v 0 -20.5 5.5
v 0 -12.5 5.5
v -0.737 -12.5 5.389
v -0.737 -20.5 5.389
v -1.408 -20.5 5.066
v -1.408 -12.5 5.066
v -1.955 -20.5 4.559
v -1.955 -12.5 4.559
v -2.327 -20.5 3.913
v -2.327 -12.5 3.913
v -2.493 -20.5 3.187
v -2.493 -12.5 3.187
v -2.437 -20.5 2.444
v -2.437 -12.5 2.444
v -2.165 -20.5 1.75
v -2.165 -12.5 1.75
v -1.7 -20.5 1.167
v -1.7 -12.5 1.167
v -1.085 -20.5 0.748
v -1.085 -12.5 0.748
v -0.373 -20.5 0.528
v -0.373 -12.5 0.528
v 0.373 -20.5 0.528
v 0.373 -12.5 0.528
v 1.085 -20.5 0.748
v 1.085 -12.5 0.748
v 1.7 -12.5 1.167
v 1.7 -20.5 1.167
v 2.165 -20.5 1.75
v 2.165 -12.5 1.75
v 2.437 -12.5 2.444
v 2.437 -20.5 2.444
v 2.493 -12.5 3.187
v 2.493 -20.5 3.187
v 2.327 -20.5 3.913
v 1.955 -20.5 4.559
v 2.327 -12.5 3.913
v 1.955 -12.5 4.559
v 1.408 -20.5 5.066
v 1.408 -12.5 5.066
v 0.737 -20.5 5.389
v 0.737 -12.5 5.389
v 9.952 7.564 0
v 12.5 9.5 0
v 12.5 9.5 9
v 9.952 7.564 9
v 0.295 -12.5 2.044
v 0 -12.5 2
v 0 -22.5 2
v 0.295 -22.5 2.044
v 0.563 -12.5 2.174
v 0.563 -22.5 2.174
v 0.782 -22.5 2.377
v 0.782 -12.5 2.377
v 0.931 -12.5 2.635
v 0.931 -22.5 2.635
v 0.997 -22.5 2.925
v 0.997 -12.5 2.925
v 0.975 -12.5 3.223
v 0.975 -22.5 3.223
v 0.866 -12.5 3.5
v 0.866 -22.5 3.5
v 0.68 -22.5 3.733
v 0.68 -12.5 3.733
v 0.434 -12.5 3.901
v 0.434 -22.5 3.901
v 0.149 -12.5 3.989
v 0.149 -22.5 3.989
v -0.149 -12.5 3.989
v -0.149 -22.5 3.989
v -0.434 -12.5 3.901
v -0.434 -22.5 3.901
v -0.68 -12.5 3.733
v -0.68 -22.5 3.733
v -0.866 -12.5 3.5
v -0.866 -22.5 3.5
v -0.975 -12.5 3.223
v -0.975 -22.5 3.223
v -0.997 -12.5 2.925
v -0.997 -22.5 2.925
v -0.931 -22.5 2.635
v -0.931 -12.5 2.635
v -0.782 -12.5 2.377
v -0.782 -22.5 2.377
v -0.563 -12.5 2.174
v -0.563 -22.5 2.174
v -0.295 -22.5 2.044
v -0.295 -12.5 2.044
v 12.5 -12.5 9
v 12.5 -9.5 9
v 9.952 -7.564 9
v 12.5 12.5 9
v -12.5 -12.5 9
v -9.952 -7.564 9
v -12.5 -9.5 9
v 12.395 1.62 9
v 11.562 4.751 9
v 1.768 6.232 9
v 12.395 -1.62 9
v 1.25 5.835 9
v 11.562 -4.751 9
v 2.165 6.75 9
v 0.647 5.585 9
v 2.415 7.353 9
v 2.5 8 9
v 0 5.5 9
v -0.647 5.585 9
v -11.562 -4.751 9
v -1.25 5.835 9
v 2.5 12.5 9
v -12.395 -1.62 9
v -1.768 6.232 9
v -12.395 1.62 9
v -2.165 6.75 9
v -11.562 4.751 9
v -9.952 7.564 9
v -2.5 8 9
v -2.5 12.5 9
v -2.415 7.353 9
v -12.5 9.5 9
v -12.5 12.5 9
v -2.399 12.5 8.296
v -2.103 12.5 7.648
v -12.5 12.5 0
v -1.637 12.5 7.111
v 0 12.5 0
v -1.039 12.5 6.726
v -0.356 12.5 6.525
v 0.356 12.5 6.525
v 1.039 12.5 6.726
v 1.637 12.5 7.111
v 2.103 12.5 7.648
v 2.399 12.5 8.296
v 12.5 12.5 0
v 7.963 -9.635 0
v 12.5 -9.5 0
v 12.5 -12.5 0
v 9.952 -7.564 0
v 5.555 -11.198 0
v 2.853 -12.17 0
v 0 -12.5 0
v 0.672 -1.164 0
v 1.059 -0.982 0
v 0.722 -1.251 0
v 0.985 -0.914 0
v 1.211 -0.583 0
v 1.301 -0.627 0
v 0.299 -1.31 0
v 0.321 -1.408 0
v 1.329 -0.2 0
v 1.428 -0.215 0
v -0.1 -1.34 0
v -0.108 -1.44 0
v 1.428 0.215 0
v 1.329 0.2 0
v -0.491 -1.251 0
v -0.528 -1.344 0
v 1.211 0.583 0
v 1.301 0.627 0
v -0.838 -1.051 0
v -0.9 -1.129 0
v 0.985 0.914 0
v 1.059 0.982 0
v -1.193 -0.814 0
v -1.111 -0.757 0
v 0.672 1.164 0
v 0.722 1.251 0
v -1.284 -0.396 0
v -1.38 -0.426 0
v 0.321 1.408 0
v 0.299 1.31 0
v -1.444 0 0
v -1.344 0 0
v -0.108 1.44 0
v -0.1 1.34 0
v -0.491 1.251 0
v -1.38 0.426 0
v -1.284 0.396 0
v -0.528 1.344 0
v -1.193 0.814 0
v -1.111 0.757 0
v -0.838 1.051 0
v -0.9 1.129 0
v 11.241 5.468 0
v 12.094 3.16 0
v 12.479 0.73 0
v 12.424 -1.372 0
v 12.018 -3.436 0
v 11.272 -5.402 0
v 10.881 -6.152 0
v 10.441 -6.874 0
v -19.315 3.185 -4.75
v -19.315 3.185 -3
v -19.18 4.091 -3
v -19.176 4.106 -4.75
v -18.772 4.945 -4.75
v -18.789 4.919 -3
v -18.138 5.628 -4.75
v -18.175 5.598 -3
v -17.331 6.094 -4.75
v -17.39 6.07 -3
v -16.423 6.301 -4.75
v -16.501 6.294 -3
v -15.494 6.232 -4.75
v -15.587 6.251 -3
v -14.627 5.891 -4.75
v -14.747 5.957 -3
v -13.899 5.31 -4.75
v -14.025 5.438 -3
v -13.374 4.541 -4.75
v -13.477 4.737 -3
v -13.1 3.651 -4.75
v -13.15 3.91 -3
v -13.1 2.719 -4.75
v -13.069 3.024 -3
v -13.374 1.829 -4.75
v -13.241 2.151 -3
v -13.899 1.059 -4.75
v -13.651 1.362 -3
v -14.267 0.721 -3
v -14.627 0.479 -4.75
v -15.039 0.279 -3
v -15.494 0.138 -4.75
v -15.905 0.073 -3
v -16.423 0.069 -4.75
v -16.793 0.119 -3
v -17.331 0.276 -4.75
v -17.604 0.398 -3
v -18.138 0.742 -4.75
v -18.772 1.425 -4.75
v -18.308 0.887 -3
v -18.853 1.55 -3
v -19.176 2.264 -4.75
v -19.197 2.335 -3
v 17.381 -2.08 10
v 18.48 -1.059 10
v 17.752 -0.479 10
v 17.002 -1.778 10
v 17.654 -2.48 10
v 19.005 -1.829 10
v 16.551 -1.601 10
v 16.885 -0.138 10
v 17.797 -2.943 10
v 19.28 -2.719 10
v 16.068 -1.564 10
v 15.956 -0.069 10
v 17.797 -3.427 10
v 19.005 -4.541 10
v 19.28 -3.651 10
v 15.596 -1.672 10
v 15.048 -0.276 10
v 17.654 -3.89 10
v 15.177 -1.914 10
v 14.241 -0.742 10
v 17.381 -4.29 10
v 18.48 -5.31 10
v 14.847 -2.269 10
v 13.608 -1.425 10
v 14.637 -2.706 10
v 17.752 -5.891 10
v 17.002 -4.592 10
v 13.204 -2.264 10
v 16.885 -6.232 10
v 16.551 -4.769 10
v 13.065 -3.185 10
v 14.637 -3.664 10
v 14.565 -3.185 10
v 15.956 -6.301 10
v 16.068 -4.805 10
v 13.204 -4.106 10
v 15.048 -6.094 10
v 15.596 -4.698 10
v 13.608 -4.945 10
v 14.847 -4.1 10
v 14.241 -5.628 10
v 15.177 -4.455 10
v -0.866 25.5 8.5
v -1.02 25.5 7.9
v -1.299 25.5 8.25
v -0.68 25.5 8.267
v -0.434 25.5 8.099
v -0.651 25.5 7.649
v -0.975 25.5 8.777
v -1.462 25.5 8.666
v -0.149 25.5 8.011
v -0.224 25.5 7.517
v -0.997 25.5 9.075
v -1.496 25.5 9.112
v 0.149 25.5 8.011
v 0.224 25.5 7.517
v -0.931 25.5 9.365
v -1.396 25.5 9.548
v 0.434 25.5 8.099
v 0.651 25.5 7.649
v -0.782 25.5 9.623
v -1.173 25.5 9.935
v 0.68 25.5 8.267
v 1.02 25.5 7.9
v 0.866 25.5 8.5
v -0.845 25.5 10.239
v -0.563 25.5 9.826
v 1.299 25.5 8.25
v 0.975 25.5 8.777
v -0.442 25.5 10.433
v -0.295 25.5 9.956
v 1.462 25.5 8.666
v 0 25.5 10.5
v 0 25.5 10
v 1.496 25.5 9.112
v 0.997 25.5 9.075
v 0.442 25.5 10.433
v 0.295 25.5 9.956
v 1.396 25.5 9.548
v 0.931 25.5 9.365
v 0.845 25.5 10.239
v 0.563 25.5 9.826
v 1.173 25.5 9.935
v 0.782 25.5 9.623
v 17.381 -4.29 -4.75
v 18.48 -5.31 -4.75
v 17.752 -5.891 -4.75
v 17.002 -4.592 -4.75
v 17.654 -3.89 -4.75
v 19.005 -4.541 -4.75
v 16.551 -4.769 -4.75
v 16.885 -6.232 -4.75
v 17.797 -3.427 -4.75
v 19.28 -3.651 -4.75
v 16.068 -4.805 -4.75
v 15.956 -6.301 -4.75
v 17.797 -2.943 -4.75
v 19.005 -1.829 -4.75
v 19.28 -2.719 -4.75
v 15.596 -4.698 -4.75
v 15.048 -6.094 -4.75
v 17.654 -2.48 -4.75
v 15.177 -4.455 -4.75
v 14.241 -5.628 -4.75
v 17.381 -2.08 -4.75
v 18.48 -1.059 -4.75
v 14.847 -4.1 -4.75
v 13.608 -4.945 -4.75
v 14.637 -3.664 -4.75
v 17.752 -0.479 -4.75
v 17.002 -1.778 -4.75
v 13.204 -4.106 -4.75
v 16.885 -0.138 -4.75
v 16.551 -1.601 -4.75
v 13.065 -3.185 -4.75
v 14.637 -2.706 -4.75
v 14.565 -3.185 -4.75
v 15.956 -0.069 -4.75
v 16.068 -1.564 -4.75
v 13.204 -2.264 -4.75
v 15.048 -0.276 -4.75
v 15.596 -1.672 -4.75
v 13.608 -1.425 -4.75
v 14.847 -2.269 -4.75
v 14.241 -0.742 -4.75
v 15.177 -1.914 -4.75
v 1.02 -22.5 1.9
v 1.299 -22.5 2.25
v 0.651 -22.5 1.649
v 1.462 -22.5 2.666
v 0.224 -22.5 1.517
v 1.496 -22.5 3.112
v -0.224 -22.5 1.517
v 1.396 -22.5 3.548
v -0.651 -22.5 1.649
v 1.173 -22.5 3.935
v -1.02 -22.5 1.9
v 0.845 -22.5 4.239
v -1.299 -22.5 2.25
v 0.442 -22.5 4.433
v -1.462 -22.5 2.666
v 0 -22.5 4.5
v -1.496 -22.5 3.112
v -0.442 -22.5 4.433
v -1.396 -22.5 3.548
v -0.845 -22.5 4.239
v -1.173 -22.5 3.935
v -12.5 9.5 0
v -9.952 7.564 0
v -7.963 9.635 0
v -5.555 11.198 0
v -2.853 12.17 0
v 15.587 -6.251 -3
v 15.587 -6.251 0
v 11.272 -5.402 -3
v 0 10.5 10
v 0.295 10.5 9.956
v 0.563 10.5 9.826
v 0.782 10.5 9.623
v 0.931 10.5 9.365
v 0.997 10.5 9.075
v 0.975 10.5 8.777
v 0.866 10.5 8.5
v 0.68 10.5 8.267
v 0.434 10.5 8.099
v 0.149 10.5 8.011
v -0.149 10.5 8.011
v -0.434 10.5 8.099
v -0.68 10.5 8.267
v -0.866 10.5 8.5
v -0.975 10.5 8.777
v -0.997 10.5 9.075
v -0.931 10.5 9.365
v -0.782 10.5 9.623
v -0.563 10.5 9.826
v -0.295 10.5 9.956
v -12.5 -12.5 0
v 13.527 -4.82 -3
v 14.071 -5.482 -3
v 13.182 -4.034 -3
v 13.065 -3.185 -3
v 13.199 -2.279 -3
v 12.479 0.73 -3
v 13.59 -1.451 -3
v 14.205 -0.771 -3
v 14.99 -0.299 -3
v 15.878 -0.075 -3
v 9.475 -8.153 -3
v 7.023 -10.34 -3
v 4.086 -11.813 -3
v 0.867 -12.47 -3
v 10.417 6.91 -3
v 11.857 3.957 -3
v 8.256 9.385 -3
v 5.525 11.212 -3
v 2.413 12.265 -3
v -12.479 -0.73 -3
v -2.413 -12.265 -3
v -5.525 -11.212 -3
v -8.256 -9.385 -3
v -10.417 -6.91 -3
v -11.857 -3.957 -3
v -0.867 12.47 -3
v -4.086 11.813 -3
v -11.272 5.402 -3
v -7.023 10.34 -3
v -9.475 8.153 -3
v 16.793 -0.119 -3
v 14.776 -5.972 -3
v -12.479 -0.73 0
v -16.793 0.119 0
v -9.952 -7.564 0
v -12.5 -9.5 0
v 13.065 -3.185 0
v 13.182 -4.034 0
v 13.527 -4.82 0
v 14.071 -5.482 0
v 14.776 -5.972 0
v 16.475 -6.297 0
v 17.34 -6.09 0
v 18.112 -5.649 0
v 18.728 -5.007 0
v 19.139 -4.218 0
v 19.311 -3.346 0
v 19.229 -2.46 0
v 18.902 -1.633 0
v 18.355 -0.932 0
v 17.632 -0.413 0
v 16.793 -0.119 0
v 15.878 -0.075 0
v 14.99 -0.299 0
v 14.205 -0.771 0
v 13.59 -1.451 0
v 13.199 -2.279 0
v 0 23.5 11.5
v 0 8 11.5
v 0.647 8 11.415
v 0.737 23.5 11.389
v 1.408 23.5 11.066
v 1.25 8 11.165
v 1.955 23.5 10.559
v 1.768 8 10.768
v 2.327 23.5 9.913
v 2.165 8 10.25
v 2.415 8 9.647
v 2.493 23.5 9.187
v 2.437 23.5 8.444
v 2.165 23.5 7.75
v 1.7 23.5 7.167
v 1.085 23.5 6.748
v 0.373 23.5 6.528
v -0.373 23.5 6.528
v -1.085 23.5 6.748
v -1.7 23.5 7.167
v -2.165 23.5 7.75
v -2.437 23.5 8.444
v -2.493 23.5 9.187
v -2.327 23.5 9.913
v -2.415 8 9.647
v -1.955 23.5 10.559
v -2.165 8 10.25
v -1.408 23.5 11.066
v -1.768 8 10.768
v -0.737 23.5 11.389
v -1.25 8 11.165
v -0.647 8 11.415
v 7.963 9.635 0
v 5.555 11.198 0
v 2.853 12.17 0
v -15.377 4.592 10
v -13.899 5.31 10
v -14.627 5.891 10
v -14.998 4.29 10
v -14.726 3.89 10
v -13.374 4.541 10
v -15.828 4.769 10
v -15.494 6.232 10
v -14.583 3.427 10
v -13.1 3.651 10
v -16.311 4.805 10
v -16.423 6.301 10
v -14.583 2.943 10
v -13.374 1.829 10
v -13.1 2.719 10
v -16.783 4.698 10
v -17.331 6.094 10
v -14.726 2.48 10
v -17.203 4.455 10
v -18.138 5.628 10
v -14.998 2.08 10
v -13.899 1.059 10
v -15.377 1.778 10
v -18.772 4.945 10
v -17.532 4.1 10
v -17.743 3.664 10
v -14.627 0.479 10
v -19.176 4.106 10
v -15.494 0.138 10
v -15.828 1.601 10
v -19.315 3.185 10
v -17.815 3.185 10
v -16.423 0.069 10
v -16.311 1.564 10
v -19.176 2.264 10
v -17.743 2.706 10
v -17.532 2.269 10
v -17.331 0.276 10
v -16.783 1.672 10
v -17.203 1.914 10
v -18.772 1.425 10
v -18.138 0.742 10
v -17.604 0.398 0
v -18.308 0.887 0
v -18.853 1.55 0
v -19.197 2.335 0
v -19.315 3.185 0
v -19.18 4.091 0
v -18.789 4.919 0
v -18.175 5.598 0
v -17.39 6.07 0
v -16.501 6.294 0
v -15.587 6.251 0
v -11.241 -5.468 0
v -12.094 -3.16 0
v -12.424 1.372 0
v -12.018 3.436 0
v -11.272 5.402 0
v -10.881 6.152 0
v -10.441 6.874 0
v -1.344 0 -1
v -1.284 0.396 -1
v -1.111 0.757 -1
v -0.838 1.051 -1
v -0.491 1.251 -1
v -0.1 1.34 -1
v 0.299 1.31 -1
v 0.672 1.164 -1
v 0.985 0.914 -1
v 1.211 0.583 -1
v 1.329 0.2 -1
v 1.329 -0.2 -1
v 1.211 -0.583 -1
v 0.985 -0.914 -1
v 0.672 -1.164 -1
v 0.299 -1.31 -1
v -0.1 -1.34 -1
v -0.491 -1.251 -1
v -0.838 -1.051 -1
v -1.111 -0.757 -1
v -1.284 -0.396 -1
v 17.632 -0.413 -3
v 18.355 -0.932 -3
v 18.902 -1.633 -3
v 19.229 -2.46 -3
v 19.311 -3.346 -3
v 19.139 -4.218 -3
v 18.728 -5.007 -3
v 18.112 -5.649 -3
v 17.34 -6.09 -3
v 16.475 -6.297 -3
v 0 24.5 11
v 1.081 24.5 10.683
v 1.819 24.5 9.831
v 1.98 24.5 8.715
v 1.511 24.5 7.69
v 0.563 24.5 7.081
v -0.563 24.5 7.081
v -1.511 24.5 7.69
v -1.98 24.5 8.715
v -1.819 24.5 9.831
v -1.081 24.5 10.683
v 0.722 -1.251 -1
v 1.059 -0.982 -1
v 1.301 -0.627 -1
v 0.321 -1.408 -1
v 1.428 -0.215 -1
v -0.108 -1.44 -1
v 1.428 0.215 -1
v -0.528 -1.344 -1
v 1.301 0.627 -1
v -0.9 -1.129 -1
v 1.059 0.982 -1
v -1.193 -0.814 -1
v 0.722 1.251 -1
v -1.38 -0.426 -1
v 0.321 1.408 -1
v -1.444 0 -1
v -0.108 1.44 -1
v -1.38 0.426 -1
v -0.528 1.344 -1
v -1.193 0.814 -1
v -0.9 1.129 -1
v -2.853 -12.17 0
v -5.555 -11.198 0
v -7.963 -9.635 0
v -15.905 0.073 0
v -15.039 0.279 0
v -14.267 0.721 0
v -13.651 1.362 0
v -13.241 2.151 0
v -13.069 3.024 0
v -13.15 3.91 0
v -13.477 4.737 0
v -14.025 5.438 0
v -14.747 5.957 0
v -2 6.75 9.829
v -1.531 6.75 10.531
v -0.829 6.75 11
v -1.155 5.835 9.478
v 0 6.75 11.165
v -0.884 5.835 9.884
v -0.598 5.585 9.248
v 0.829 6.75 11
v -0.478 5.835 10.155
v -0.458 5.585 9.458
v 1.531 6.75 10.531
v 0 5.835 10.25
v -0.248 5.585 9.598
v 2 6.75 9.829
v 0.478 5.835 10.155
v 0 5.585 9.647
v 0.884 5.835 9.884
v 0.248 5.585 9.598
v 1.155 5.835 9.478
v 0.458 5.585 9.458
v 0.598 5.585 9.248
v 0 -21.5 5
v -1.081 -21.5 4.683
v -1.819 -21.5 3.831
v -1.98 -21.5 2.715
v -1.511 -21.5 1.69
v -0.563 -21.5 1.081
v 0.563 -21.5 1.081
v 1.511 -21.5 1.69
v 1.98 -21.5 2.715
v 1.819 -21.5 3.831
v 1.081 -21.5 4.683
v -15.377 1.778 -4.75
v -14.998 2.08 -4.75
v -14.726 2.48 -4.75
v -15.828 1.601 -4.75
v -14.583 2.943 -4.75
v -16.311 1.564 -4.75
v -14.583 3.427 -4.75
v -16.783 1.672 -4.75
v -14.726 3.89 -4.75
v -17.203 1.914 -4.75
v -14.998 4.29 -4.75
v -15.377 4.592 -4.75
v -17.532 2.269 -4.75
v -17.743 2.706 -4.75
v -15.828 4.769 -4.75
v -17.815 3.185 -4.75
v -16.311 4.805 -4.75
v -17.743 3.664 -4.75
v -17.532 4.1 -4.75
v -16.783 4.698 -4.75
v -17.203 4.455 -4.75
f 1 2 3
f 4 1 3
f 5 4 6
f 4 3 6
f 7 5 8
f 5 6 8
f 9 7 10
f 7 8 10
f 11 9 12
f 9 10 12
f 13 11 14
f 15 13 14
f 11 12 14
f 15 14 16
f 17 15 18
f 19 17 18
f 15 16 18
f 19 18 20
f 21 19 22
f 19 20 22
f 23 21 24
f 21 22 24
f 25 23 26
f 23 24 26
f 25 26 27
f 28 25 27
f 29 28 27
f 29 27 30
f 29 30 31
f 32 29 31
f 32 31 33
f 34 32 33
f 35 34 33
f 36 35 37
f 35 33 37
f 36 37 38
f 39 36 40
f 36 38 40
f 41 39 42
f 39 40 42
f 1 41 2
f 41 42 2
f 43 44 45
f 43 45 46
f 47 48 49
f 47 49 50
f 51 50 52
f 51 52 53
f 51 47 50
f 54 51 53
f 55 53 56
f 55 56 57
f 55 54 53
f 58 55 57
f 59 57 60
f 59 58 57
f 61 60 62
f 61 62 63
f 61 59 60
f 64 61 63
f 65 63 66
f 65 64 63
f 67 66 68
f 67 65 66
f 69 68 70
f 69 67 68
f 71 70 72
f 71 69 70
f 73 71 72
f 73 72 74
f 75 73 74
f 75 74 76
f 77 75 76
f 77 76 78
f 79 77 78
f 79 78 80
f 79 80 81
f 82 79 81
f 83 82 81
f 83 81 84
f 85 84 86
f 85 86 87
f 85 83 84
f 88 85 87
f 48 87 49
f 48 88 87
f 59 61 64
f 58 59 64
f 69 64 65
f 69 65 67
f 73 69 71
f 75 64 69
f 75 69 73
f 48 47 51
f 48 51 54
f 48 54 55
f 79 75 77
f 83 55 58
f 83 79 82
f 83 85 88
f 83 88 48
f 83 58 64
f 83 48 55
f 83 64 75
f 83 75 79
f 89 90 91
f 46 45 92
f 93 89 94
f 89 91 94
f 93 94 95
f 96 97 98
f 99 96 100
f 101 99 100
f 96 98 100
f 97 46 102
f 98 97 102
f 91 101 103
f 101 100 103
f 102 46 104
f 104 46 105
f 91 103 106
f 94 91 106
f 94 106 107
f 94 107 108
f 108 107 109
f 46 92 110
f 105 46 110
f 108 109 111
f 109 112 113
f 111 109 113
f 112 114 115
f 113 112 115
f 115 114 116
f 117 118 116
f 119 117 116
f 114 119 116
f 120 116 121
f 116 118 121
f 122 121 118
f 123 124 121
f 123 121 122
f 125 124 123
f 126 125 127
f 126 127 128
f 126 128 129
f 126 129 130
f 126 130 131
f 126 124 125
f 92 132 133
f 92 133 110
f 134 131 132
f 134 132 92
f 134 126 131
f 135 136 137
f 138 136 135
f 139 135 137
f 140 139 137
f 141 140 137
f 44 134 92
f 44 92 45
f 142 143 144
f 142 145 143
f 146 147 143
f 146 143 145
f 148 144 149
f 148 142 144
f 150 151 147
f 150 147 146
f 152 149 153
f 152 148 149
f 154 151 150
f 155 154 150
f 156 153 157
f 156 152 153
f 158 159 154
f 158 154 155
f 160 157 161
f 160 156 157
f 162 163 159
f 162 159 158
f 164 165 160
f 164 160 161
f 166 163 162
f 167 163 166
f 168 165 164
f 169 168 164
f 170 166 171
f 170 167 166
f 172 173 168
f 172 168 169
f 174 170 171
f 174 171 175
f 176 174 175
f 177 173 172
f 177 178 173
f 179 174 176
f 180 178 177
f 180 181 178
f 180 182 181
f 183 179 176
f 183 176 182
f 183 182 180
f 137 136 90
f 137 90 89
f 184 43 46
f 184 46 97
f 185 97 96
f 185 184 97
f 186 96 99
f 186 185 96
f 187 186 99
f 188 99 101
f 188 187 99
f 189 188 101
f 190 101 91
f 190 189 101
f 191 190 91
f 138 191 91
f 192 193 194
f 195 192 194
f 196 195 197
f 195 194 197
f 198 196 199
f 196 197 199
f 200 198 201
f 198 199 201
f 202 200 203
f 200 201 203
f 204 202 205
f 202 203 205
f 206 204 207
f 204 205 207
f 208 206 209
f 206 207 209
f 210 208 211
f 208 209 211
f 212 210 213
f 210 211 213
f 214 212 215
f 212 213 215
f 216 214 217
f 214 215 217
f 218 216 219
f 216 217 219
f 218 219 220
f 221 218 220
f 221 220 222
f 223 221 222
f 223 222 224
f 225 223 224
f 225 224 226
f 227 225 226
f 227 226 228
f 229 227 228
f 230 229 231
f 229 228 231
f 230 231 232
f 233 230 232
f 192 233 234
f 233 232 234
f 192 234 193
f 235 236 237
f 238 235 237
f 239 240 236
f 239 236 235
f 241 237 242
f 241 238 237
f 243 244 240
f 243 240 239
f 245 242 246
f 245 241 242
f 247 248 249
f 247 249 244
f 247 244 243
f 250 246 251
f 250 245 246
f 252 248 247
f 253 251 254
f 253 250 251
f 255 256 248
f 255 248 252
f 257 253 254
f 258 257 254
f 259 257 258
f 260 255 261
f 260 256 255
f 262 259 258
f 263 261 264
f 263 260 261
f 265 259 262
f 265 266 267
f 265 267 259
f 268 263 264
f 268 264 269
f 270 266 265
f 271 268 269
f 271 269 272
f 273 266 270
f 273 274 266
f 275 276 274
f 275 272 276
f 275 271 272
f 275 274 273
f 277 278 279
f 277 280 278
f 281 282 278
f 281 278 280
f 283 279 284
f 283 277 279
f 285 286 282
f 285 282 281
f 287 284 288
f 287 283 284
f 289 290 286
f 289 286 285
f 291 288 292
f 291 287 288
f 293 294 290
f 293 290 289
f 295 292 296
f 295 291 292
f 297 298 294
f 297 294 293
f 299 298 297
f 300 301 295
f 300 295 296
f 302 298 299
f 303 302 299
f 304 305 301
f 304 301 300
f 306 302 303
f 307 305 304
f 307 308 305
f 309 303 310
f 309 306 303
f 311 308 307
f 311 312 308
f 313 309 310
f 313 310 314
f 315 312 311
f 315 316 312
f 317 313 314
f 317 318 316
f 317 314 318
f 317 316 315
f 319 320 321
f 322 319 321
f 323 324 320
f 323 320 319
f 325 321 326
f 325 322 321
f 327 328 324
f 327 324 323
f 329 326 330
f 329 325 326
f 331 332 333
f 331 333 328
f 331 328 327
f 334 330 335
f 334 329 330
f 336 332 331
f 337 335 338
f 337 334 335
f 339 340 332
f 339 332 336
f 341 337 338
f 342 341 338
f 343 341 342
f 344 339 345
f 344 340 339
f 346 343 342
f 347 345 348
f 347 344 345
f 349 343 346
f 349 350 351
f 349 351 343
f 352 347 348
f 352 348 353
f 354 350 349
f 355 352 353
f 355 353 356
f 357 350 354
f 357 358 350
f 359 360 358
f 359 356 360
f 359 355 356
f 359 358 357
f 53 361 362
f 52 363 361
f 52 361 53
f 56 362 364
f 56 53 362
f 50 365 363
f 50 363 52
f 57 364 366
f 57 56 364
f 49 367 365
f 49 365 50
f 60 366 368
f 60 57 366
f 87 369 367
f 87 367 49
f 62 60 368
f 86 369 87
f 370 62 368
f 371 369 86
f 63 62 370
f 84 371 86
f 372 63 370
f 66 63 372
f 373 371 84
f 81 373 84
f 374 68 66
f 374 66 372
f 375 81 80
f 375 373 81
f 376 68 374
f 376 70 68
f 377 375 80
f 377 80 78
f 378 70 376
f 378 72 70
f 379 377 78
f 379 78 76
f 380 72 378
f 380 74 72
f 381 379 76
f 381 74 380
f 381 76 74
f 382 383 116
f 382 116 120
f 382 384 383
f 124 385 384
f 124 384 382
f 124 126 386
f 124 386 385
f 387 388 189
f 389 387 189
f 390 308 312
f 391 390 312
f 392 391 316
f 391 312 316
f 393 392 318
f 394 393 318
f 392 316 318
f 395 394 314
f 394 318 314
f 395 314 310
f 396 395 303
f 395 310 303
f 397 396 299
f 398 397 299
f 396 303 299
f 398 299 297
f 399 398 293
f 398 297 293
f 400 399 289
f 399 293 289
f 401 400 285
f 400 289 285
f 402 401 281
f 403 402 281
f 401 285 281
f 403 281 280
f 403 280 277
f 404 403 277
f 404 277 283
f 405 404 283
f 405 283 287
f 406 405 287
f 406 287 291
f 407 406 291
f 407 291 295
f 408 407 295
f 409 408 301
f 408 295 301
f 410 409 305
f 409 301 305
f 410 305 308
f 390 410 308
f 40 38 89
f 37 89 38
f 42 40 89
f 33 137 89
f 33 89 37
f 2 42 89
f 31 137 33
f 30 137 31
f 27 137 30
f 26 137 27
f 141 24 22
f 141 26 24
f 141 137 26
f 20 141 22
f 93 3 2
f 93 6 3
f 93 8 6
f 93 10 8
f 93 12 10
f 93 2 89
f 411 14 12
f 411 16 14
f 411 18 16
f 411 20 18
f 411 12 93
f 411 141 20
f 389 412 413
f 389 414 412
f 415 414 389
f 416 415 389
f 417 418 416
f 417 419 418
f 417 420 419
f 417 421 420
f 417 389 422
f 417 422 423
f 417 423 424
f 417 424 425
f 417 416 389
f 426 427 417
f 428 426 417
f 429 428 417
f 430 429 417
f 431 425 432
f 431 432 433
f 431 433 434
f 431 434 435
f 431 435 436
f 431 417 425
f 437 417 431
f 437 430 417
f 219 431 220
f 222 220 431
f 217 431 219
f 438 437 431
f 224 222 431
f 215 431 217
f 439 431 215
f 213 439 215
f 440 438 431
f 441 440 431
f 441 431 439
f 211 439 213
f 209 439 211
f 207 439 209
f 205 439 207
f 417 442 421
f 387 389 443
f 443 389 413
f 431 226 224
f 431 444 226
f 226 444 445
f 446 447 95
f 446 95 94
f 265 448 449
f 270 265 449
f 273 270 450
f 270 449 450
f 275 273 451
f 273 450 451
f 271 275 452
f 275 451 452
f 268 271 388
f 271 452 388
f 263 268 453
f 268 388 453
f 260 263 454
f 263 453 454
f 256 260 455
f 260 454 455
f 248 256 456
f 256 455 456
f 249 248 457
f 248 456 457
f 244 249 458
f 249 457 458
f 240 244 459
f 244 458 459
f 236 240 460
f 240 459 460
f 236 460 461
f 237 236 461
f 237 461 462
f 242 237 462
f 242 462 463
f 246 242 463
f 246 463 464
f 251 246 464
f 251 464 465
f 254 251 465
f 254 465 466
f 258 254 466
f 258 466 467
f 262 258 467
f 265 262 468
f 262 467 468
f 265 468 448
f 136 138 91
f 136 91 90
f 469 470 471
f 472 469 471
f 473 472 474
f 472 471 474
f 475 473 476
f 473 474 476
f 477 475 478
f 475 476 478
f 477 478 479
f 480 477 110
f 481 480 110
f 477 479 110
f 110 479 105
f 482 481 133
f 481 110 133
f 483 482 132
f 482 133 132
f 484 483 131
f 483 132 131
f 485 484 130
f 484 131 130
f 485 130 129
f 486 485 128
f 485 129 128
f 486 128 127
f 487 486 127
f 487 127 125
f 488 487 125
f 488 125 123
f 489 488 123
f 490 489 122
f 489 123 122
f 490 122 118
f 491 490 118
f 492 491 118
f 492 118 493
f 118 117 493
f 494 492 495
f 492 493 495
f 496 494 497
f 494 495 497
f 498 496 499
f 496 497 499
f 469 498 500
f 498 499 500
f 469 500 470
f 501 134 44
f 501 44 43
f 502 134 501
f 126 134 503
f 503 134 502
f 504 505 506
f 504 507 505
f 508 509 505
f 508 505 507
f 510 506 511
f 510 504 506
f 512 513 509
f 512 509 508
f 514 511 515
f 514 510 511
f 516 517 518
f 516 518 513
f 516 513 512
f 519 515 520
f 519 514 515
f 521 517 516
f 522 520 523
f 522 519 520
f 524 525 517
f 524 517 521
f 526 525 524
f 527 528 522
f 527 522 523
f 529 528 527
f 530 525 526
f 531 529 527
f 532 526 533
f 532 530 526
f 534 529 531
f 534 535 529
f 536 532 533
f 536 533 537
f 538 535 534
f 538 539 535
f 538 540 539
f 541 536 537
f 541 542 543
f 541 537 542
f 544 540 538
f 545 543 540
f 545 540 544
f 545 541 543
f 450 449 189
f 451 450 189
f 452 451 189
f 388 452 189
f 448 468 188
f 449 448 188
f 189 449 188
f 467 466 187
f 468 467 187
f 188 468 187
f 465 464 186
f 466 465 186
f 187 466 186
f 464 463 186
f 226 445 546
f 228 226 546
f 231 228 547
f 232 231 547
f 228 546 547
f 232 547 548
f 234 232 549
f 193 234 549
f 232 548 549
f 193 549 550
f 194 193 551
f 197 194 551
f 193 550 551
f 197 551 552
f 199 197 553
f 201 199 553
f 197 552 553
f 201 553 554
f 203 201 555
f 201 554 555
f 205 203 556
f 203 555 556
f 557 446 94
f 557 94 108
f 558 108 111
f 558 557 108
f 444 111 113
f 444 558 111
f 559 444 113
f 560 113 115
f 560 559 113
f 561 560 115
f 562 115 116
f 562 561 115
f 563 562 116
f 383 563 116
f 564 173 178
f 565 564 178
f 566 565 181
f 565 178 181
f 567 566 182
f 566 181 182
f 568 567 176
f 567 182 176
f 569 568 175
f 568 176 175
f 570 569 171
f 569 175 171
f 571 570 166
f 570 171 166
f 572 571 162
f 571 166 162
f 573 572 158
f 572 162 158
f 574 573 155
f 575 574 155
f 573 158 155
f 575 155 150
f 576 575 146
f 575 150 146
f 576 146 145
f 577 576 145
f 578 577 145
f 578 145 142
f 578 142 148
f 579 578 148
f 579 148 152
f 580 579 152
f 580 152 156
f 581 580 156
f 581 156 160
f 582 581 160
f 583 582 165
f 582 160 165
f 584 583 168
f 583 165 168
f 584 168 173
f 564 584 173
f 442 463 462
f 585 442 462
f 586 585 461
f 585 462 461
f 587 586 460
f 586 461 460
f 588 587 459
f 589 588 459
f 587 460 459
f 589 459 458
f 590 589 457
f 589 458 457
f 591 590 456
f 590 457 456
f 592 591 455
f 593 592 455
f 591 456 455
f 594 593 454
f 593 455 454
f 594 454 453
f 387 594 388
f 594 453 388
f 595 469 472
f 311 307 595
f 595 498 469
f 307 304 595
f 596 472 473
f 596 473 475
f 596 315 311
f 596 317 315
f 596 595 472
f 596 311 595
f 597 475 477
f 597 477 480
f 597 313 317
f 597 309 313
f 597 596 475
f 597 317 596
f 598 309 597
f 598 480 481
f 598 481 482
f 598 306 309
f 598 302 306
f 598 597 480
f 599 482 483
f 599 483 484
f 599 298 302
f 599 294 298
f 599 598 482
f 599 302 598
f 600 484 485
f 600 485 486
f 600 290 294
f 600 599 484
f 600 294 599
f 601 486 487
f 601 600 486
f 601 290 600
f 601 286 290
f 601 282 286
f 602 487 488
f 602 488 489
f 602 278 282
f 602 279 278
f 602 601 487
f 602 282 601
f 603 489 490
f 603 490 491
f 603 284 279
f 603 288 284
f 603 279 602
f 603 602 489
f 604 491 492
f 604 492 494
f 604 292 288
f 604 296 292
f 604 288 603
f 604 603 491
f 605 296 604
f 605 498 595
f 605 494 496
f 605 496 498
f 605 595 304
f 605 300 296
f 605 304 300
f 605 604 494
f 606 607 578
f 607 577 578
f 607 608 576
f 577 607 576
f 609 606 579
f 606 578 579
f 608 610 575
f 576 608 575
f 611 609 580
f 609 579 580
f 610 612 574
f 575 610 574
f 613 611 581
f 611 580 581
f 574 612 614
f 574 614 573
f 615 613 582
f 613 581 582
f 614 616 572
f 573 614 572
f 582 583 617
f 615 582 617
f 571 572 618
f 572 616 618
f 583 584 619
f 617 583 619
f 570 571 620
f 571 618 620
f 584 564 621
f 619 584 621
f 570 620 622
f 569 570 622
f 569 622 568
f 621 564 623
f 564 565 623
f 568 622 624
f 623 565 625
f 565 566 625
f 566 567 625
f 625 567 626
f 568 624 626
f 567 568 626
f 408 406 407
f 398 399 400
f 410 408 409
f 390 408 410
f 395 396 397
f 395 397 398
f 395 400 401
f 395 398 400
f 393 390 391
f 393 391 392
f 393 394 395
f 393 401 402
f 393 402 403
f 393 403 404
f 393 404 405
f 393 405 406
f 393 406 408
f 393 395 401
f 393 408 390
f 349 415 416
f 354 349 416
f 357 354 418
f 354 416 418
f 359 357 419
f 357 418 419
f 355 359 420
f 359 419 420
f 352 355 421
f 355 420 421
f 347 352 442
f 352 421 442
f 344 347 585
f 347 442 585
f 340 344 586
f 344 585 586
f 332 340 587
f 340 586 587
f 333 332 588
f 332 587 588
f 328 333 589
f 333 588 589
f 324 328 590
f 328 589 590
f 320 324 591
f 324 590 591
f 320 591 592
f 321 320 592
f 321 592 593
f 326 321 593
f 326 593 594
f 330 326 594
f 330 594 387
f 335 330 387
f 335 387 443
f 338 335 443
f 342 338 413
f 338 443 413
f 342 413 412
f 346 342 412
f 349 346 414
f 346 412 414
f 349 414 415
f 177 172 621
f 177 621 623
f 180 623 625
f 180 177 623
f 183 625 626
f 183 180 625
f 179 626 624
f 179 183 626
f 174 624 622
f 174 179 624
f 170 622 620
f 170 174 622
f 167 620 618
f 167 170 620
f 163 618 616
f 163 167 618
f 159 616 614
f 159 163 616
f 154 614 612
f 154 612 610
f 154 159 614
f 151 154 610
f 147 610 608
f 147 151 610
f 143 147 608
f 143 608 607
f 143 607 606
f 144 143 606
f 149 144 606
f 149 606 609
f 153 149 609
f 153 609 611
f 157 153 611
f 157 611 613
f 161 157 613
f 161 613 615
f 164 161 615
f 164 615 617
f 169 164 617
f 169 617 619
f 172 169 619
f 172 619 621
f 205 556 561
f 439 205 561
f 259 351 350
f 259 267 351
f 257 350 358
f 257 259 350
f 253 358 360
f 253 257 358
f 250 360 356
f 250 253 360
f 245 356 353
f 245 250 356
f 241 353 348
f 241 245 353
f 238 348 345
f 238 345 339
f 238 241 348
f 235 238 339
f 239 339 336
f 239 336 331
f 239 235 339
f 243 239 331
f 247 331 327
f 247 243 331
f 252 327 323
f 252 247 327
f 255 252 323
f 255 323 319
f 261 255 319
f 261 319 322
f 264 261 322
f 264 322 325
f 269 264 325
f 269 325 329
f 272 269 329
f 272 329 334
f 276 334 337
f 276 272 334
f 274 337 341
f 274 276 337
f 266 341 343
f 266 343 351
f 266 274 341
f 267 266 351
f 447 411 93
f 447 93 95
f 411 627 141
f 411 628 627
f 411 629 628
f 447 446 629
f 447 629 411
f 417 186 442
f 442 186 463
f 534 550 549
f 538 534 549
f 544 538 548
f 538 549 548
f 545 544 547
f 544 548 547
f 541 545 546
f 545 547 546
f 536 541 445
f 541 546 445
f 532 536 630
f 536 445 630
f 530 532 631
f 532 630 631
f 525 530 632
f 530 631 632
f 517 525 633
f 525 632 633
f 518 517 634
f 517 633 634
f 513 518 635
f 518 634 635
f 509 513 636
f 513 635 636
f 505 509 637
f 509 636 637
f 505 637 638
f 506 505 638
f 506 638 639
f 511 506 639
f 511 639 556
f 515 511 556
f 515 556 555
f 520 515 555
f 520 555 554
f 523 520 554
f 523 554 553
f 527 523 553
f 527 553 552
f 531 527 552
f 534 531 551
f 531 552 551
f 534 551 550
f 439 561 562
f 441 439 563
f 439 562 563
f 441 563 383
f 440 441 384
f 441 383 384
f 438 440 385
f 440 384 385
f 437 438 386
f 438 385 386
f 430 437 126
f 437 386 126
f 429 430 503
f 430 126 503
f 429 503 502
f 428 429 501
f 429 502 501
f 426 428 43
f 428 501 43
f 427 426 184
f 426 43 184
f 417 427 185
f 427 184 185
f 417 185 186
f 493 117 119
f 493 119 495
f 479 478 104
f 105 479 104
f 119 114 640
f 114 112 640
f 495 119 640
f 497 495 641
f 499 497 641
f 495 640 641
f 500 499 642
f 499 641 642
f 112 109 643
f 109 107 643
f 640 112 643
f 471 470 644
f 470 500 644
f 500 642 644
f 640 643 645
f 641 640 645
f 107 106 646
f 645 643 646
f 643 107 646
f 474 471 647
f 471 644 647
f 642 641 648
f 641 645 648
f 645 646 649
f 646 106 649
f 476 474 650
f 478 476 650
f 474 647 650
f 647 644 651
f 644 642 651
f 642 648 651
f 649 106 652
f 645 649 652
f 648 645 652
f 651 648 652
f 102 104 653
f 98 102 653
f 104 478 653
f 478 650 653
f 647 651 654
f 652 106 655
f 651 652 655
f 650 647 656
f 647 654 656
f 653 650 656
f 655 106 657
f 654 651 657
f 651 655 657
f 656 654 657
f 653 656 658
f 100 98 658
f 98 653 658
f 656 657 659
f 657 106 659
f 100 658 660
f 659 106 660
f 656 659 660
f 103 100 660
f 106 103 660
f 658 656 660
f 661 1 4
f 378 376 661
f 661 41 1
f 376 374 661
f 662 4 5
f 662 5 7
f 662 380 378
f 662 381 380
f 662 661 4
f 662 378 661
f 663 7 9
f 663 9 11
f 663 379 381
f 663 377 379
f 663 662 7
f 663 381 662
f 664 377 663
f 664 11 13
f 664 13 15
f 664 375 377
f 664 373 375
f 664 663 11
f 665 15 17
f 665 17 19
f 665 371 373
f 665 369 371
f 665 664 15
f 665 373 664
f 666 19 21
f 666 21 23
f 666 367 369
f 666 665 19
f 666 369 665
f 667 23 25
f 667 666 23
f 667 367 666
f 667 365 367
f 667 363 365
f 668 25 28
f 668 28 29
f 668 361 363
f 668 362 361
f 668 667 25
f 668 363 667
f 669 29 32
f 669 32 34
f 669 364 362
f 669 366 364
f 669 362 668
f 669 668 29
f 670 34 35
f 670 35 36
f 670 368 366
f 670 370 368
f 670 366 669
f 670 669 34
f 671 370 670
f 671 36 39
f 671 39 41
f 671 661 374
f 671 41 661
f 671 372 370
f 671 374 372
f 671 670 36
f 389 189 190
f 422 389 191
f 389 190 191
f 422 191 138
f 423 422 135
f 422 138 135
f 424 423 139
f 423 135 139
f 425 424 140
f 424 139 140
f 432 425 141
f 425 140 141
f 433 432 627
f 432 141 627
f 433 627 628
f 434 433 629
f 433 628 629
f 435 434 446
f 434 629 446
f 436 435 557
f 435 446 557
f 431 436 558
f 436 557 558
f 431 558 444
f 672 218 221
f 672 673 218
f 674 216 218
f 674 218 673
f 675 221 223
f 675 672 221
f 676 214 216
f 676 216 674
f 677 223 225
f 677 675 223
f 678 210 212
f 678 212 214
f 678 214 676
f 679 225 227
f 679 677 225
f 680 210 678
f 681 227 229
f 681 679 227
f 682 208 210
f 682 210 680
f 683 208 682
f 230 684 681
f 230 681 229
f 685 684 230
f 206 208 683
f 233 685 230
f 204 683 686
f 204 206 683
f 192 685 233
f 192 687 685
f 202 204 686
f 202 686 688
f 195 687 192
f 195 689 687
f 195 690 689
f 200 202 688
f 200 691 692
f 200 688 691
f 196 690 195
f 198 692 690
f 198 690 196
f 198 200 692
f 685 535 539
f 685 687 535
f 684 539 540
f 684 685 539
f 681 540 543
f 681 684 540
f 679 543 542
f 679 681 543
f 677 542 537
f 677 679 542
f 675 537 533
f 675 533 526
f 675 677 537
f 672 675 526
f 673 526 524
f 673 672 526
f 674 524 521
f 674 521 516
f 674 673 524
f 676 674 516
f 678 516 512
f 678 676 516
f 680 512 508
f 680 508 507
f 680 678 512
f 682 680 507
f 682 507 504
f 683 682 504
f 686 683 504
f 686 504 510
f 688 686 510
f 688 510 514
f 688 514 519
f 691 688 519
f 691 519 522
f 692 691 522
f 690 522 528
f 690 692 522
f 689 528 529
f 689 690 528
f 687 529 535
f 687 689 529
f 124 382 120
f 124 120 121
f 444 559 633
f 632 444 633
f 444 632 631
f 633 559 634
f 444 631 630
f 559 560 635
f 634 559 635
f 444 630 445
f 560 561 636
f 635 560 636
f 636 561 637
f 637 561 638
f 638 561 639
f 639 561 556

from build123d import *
from OCP.BRepFilletAPI import BRepFilletAPI_MakeChamfer
from build123d.topology import SkipClean

# Parameters (mm, degrees)
SALIENTE_EXTRUIR1_DEPTH      = 9
CROQUIS3_R                   = 1.344119186
SALIENTE_EXTRUIR2_DEPTH      = 1
CROQUIS4_R                   = 12.5
CROQUIS4_R_2                 = 1.444119186
SALIENTE_EXTRUIR3_DEPTH      = 3
CROQUIS5_R                   = 1.444119186
SALIENTE_EXTRUIR4_DEPTH      = 2
SALIENTE_EXTRUIR5_START      = -3
CROQUIS6_R                   = 1.625
SALIENTE_EXTRUIR5_DEPTH      = 3
CROQUIS7_R                   = 3.125
CROQUIS7_R_2                 = 1.625
SALIENTE_EXTRUIR6_DEPTH      = 1.75
CROQUIS8_R                   = 3.125
CROQUIS8_R_2                 = 1.625
SALIENTE_EXTRUIR7_DEPTH      = 10
SALIENTE_EXTRUIR8_DEPTH      = 13
SALIENTE_EXTRUIR8_DEPTH_BACK = 7
CROQUIS9_R                   = 2.5
REDONDEO1_R                  = 2.5
CROQUIS11_R                  = 2.5
CROQUIS11_R_2                = 1
SALIENTE_EXTRUIR9_DEPTH      = 10
CHAFL_N1_SIZE                = 2
CHAFL_N1_SIZE2               = 1
CROQUIS10_R                  = 1
CORTAR_EXTRUIR1_DEPTH        = 15


with BuildPart() as part:
    # Croquis2 → Saliente-Extruir1 (new body)
    with BuildSketch(Plane.XY):
        with BuildLine():
            Line((-12.5, 12.5), (12.5, 12.5))
            Line((12.5, 12.5), (12.5, 9.5))
            Line((12.5, 9.5), (9.952027427, 7.563540844))
            ThreePointArc((9.952027427, 7.563540844), (12.5, 0), (9.952027427, -7.563540844))
            Line((9.952027427, -7.563540844), (12.5, -9.5))
            Line((12.5, -9.5), (12.5, -12.5))
            Line((12.5, -12.5), (-12.5, -12.5))
            Line((-12.5, -12.5), (-12.5, -9.5))
            Line((-12.5, -9.5), (-9.952027427, -7.563540844))
            ThreePointArc((-9.952027427, -7.563540844), (-12.5, 0), (-9.952027427, 7.563540844))
            Line((-9.952027427, 7.563540844), (-12.5, 9.5))
            Line((-12.5, 9.5), (-12.5, 12.5))
        make_face()
    extrude(amount=SALIENTE_EXTRUIR1_DEPTH)

    # Croquis3 → Saliente-Extruir2 (add)
    with BuildSketch(Plane(origin=(0, 0, 0), x_dir=(-1, 0, 0), z_dir=(0, 0, -1))):
        Circle(CROQUIS3_R)
    extrude(amount=SALIENTE_EXTRUIR2_DEPTH)



with BuildPart() as body_2:
    # Croquis4 → Saliente-Extruir3 (new body)
    with BuildSketch(Plane(origin=(0, 0, 0), x_dir=(-1, 0, 0), z_dir=(0, 0, -1))):
        Circle(CROQUIS4_R)
        Circle(CROQUIS4_R_2, mode=Mode.SUBTRACT)
    extrude(amount=SALIENTE_EXTRUIR3_DEPTH)

    # Croquis5 → Saliente-Extruir4 (add)
    with BuildSketch(Plane(origin=(0, 0, -3), x_dir=(-1, 0, 0), z_dir=(0, 0, -1))):
        Circle(CROQUIS5_R)
    extrude(amount=-SALIENTE_EXTRUIR4_DEPTH)

    # Croquis6 → Saliente-Extruir5 (add)
    # profile 1 of 2: a face of its own
    with BuildSketch(Plane(origin=(0, 0, -3), x_dir=(-1, 0, 0), z_dir=(0, 0, -1)).offset(SALIENTE_EXTRUIR5_START)):
        with BuildLine():
            Line((-12.478662951, 0.73004859), (-16.792901594, -0.118663584))
            ThreePointArc((-16.792901594, -0.118663584), (-19.255933186, -3.788094791), (-15.586501979, -6.251126382))
            Line((-15.586501979, -6.251126382), (-11.272263337, -5.402414208))
            ThreePointArc((-11.272263337, -5.402414208), (-12.264925596, -2.41279923), (-12.478662951, 0.73004859))
        make_face()
        with Locations((-16.189701787, -3.184894983)):
            Circle(CROQUIS6_R, mode=Mode.SUBTRACT)
    # profile 2 of 2: a face of its own
    with BuildSketch(Plane(origin=(0, 0, -3), x_dir=(-1, 0, 0), z_dir=(0, 0, -1)).offset(SALIENTE_EXTRUIR5_START)):
        with BuildLine():
            Line((15.586501979, 6.251126382), (11.272263337, 5.402414208))
            ThreePointArc((11.272263337, 5.402414208), (12.264925596, 2.41279923), (12.478662951, -0.73004859))
            Line((12.478662951, -0.73004859), (16.792901594, 0.118663584))
            ThreePointArc((16.792901594, 0.118663584), (19.255933186, 3.788094791), (15.586501979, 6.251126382))
        make_face()
        with Locations((16.189701787, 3.184894983)):
            Circle(CROQUIS6_R, mode=Mode.SUBTRACT)
    extrude(amount=SALIENTE_EXTRUIR5_DEPTH)

    # Croquis7 → Saliente-Extruir6 (add)
    # profile 1 of 2: a face of its own
    with BuildSketch(Plane(origin=(0, 0, -3), x_dir=(-1, 0, 0), z_dir=(0, 0, -1))):
        with Locations((-16.189701787, -3.184894983)):
            Circle(CROQUIS7_R)
        with Locations((-16.189701787, -3.184894983)):
            Circle(CROQUIS7_R_2, mode=Mode.SUBTRACT)
    # profile 2 of 2: a face of its own
    with BuildSketch(Plane(origin=(0, 0, -3), x_dir=(-1, 0, 0), z_dir=(0, 0, -1))):
        with Locations((16.189701787, 3.184894983)):
            Circle(CROQUIS7_R)
        with Locations((16.189701787, 3.184894983)):
            Circle(CROQUIS7_R_2, mode=Mode.SUBTRACT)
    extrude(amount=SALIENTE_EXTRUIR6_DEPTH)

    # Croquis8 → Saliente-Extruir7 (add)
    # profile 1 of 2: a face of its own
    with SkipClean():  # the faces are left unmerged after this step: merging them gives an invalid solid
        with BuildSketch(Plane.XY):
            with Locations(Location((-16.189701787, 3.184894983, 0), (0, 0, 180))):
                Circle(CROQUIS8_R)
            with Locations(Location((-16.189701787, 3.184894983, 0), (0, 0, 180))):
                Circle(CROQUIS8_R_2, mode=Mode.SUBTRACT)
        # profile 2 of 2: a face of its own
        with BuildSketch(Plane.XY):
            with Locations(Location((16.189701787, -3.184894983, 0), (0, 0, 180))):
                Circle(CROQUIS8_R)
            with Locations(Location((16.189701787, -3.184894983, 0), (0, 0, 180))):
                Circle(CROQUIS8_R_2, mode=Mode.SUBTRACT)
        extrude(amount=SALIENTE_EXTRUIR7_DEPTH)


with BuildPart() as part_1:
    add(part.part)

    add(body_2.part)  # Saliente-Extruir8 merges body 2
    # Croquis9 → Saliente-Extruir8 (add, two sides: drawn at the far end of the back side and taken through both)
    with BuildSketch(Plane(origin=(0, 12.5, 0), x_dir=(1, 0, 0), z_dir=(0, 1, 0)).offset(-SALIENTE_EXTRUIR8_DEPTH_BACK)):
        with Locations(Location((0, -9, 0), (0, 0, 270))):
            Circle(CROQUIS9_R)
    extrude(amount=SALIENTE_EXTRUIR8_DEPTH + SALIENTE_EXTRUIR8_DEPTH_BACK)

    # Redondeo1
    redondeo1_edges = [part_1.edges().sort_by_distance(p)[0] for p in [
        (1.767766953, 5.5, 10.767766953),
    ]]
    fillet(redondeo1_edges, radius=REDONDEO1_R - 0.0001)  # a hair under: the kernel refuses the full size

    # Croquis11 → Saliente-Extruir9 (add)
    with BuildSketch(Plane.XZ.offset(12.5)):
        with Locations(Location((0, 3, 0), (0, 0, 90))):
            Circle(CROQUIS11_R)
        with Locations(Location((0, 3, 0), (0, 0, 270))):
            Circle(CROQUIS11_R_2, mode=Mode.SUBTRACT)
    extrude(amount=SALIENTE_EXTRUIR9_DEPTH)

    # Chaflán1: one chamfer whose edges measure the first distance from different faces: ONE call of the kernel's chamfer builder (chamfer() names one face for all edges)
    chafl_n1_edges_1 = [part_1.edges().sort_by_distance(p)[0] for p in [
        (0, 25.5, 6.5),
    ]]
    chafl_n1_side_1 = [part_1.faces().sort_by_distance(p)[0] for p in [
        (0, 19, 6.5),
    ]]
    chafl_n1_edges_2 = [part_1.edges().sort_by_distance(p)[0] for p in [
        (0, -22.5, 0.5),
    ]]
    chafl_n1_side_2 = [part_1.faces().sort_by_distance(p)[0] for p in [
        (0, -17.5, 0.5),
    ]]
    chafl_n1 = BRepFilletAPI_MakeChamfer(part_1.part.solid().wrapped)
    for e in chafl_n1_edges_1:
        chafl_n1.Add(CHAFL_N1_SIZE, CHAFL_N1_SIZE2, e.wrapped, chafl_n1_side_1[0].wrapped)  # the first distance lies on this face
    for e in chafl_n1_edges_2:
        chafl_n1.Add(CHAFL_N1_SIZE, CHAFL_N1_SIZE2, e.wrapped, chafl_n1_side_2[0].wrapped)  # the first distance lies on this face
    add(Compound.cast(chafl_n1.Shape()), mode=Mode.REPLACE)

    # Croquis10 → Cortar-Extruir1 (cut)
    with BuildSketch(Plane(origin=(0, 25.5, 0), x_dir=(1, 0, 0), z_dir=(0, 1, 0))):
        with Locations(Location((0, -9, 0), (0, 0, 270))):
            Circle(CROQUIS10_R)
    extrude(amount=-CORTAR_EXTRUIR1_DEPTH, mode=Mode.SUBTRACT)


solid = part_1.part
